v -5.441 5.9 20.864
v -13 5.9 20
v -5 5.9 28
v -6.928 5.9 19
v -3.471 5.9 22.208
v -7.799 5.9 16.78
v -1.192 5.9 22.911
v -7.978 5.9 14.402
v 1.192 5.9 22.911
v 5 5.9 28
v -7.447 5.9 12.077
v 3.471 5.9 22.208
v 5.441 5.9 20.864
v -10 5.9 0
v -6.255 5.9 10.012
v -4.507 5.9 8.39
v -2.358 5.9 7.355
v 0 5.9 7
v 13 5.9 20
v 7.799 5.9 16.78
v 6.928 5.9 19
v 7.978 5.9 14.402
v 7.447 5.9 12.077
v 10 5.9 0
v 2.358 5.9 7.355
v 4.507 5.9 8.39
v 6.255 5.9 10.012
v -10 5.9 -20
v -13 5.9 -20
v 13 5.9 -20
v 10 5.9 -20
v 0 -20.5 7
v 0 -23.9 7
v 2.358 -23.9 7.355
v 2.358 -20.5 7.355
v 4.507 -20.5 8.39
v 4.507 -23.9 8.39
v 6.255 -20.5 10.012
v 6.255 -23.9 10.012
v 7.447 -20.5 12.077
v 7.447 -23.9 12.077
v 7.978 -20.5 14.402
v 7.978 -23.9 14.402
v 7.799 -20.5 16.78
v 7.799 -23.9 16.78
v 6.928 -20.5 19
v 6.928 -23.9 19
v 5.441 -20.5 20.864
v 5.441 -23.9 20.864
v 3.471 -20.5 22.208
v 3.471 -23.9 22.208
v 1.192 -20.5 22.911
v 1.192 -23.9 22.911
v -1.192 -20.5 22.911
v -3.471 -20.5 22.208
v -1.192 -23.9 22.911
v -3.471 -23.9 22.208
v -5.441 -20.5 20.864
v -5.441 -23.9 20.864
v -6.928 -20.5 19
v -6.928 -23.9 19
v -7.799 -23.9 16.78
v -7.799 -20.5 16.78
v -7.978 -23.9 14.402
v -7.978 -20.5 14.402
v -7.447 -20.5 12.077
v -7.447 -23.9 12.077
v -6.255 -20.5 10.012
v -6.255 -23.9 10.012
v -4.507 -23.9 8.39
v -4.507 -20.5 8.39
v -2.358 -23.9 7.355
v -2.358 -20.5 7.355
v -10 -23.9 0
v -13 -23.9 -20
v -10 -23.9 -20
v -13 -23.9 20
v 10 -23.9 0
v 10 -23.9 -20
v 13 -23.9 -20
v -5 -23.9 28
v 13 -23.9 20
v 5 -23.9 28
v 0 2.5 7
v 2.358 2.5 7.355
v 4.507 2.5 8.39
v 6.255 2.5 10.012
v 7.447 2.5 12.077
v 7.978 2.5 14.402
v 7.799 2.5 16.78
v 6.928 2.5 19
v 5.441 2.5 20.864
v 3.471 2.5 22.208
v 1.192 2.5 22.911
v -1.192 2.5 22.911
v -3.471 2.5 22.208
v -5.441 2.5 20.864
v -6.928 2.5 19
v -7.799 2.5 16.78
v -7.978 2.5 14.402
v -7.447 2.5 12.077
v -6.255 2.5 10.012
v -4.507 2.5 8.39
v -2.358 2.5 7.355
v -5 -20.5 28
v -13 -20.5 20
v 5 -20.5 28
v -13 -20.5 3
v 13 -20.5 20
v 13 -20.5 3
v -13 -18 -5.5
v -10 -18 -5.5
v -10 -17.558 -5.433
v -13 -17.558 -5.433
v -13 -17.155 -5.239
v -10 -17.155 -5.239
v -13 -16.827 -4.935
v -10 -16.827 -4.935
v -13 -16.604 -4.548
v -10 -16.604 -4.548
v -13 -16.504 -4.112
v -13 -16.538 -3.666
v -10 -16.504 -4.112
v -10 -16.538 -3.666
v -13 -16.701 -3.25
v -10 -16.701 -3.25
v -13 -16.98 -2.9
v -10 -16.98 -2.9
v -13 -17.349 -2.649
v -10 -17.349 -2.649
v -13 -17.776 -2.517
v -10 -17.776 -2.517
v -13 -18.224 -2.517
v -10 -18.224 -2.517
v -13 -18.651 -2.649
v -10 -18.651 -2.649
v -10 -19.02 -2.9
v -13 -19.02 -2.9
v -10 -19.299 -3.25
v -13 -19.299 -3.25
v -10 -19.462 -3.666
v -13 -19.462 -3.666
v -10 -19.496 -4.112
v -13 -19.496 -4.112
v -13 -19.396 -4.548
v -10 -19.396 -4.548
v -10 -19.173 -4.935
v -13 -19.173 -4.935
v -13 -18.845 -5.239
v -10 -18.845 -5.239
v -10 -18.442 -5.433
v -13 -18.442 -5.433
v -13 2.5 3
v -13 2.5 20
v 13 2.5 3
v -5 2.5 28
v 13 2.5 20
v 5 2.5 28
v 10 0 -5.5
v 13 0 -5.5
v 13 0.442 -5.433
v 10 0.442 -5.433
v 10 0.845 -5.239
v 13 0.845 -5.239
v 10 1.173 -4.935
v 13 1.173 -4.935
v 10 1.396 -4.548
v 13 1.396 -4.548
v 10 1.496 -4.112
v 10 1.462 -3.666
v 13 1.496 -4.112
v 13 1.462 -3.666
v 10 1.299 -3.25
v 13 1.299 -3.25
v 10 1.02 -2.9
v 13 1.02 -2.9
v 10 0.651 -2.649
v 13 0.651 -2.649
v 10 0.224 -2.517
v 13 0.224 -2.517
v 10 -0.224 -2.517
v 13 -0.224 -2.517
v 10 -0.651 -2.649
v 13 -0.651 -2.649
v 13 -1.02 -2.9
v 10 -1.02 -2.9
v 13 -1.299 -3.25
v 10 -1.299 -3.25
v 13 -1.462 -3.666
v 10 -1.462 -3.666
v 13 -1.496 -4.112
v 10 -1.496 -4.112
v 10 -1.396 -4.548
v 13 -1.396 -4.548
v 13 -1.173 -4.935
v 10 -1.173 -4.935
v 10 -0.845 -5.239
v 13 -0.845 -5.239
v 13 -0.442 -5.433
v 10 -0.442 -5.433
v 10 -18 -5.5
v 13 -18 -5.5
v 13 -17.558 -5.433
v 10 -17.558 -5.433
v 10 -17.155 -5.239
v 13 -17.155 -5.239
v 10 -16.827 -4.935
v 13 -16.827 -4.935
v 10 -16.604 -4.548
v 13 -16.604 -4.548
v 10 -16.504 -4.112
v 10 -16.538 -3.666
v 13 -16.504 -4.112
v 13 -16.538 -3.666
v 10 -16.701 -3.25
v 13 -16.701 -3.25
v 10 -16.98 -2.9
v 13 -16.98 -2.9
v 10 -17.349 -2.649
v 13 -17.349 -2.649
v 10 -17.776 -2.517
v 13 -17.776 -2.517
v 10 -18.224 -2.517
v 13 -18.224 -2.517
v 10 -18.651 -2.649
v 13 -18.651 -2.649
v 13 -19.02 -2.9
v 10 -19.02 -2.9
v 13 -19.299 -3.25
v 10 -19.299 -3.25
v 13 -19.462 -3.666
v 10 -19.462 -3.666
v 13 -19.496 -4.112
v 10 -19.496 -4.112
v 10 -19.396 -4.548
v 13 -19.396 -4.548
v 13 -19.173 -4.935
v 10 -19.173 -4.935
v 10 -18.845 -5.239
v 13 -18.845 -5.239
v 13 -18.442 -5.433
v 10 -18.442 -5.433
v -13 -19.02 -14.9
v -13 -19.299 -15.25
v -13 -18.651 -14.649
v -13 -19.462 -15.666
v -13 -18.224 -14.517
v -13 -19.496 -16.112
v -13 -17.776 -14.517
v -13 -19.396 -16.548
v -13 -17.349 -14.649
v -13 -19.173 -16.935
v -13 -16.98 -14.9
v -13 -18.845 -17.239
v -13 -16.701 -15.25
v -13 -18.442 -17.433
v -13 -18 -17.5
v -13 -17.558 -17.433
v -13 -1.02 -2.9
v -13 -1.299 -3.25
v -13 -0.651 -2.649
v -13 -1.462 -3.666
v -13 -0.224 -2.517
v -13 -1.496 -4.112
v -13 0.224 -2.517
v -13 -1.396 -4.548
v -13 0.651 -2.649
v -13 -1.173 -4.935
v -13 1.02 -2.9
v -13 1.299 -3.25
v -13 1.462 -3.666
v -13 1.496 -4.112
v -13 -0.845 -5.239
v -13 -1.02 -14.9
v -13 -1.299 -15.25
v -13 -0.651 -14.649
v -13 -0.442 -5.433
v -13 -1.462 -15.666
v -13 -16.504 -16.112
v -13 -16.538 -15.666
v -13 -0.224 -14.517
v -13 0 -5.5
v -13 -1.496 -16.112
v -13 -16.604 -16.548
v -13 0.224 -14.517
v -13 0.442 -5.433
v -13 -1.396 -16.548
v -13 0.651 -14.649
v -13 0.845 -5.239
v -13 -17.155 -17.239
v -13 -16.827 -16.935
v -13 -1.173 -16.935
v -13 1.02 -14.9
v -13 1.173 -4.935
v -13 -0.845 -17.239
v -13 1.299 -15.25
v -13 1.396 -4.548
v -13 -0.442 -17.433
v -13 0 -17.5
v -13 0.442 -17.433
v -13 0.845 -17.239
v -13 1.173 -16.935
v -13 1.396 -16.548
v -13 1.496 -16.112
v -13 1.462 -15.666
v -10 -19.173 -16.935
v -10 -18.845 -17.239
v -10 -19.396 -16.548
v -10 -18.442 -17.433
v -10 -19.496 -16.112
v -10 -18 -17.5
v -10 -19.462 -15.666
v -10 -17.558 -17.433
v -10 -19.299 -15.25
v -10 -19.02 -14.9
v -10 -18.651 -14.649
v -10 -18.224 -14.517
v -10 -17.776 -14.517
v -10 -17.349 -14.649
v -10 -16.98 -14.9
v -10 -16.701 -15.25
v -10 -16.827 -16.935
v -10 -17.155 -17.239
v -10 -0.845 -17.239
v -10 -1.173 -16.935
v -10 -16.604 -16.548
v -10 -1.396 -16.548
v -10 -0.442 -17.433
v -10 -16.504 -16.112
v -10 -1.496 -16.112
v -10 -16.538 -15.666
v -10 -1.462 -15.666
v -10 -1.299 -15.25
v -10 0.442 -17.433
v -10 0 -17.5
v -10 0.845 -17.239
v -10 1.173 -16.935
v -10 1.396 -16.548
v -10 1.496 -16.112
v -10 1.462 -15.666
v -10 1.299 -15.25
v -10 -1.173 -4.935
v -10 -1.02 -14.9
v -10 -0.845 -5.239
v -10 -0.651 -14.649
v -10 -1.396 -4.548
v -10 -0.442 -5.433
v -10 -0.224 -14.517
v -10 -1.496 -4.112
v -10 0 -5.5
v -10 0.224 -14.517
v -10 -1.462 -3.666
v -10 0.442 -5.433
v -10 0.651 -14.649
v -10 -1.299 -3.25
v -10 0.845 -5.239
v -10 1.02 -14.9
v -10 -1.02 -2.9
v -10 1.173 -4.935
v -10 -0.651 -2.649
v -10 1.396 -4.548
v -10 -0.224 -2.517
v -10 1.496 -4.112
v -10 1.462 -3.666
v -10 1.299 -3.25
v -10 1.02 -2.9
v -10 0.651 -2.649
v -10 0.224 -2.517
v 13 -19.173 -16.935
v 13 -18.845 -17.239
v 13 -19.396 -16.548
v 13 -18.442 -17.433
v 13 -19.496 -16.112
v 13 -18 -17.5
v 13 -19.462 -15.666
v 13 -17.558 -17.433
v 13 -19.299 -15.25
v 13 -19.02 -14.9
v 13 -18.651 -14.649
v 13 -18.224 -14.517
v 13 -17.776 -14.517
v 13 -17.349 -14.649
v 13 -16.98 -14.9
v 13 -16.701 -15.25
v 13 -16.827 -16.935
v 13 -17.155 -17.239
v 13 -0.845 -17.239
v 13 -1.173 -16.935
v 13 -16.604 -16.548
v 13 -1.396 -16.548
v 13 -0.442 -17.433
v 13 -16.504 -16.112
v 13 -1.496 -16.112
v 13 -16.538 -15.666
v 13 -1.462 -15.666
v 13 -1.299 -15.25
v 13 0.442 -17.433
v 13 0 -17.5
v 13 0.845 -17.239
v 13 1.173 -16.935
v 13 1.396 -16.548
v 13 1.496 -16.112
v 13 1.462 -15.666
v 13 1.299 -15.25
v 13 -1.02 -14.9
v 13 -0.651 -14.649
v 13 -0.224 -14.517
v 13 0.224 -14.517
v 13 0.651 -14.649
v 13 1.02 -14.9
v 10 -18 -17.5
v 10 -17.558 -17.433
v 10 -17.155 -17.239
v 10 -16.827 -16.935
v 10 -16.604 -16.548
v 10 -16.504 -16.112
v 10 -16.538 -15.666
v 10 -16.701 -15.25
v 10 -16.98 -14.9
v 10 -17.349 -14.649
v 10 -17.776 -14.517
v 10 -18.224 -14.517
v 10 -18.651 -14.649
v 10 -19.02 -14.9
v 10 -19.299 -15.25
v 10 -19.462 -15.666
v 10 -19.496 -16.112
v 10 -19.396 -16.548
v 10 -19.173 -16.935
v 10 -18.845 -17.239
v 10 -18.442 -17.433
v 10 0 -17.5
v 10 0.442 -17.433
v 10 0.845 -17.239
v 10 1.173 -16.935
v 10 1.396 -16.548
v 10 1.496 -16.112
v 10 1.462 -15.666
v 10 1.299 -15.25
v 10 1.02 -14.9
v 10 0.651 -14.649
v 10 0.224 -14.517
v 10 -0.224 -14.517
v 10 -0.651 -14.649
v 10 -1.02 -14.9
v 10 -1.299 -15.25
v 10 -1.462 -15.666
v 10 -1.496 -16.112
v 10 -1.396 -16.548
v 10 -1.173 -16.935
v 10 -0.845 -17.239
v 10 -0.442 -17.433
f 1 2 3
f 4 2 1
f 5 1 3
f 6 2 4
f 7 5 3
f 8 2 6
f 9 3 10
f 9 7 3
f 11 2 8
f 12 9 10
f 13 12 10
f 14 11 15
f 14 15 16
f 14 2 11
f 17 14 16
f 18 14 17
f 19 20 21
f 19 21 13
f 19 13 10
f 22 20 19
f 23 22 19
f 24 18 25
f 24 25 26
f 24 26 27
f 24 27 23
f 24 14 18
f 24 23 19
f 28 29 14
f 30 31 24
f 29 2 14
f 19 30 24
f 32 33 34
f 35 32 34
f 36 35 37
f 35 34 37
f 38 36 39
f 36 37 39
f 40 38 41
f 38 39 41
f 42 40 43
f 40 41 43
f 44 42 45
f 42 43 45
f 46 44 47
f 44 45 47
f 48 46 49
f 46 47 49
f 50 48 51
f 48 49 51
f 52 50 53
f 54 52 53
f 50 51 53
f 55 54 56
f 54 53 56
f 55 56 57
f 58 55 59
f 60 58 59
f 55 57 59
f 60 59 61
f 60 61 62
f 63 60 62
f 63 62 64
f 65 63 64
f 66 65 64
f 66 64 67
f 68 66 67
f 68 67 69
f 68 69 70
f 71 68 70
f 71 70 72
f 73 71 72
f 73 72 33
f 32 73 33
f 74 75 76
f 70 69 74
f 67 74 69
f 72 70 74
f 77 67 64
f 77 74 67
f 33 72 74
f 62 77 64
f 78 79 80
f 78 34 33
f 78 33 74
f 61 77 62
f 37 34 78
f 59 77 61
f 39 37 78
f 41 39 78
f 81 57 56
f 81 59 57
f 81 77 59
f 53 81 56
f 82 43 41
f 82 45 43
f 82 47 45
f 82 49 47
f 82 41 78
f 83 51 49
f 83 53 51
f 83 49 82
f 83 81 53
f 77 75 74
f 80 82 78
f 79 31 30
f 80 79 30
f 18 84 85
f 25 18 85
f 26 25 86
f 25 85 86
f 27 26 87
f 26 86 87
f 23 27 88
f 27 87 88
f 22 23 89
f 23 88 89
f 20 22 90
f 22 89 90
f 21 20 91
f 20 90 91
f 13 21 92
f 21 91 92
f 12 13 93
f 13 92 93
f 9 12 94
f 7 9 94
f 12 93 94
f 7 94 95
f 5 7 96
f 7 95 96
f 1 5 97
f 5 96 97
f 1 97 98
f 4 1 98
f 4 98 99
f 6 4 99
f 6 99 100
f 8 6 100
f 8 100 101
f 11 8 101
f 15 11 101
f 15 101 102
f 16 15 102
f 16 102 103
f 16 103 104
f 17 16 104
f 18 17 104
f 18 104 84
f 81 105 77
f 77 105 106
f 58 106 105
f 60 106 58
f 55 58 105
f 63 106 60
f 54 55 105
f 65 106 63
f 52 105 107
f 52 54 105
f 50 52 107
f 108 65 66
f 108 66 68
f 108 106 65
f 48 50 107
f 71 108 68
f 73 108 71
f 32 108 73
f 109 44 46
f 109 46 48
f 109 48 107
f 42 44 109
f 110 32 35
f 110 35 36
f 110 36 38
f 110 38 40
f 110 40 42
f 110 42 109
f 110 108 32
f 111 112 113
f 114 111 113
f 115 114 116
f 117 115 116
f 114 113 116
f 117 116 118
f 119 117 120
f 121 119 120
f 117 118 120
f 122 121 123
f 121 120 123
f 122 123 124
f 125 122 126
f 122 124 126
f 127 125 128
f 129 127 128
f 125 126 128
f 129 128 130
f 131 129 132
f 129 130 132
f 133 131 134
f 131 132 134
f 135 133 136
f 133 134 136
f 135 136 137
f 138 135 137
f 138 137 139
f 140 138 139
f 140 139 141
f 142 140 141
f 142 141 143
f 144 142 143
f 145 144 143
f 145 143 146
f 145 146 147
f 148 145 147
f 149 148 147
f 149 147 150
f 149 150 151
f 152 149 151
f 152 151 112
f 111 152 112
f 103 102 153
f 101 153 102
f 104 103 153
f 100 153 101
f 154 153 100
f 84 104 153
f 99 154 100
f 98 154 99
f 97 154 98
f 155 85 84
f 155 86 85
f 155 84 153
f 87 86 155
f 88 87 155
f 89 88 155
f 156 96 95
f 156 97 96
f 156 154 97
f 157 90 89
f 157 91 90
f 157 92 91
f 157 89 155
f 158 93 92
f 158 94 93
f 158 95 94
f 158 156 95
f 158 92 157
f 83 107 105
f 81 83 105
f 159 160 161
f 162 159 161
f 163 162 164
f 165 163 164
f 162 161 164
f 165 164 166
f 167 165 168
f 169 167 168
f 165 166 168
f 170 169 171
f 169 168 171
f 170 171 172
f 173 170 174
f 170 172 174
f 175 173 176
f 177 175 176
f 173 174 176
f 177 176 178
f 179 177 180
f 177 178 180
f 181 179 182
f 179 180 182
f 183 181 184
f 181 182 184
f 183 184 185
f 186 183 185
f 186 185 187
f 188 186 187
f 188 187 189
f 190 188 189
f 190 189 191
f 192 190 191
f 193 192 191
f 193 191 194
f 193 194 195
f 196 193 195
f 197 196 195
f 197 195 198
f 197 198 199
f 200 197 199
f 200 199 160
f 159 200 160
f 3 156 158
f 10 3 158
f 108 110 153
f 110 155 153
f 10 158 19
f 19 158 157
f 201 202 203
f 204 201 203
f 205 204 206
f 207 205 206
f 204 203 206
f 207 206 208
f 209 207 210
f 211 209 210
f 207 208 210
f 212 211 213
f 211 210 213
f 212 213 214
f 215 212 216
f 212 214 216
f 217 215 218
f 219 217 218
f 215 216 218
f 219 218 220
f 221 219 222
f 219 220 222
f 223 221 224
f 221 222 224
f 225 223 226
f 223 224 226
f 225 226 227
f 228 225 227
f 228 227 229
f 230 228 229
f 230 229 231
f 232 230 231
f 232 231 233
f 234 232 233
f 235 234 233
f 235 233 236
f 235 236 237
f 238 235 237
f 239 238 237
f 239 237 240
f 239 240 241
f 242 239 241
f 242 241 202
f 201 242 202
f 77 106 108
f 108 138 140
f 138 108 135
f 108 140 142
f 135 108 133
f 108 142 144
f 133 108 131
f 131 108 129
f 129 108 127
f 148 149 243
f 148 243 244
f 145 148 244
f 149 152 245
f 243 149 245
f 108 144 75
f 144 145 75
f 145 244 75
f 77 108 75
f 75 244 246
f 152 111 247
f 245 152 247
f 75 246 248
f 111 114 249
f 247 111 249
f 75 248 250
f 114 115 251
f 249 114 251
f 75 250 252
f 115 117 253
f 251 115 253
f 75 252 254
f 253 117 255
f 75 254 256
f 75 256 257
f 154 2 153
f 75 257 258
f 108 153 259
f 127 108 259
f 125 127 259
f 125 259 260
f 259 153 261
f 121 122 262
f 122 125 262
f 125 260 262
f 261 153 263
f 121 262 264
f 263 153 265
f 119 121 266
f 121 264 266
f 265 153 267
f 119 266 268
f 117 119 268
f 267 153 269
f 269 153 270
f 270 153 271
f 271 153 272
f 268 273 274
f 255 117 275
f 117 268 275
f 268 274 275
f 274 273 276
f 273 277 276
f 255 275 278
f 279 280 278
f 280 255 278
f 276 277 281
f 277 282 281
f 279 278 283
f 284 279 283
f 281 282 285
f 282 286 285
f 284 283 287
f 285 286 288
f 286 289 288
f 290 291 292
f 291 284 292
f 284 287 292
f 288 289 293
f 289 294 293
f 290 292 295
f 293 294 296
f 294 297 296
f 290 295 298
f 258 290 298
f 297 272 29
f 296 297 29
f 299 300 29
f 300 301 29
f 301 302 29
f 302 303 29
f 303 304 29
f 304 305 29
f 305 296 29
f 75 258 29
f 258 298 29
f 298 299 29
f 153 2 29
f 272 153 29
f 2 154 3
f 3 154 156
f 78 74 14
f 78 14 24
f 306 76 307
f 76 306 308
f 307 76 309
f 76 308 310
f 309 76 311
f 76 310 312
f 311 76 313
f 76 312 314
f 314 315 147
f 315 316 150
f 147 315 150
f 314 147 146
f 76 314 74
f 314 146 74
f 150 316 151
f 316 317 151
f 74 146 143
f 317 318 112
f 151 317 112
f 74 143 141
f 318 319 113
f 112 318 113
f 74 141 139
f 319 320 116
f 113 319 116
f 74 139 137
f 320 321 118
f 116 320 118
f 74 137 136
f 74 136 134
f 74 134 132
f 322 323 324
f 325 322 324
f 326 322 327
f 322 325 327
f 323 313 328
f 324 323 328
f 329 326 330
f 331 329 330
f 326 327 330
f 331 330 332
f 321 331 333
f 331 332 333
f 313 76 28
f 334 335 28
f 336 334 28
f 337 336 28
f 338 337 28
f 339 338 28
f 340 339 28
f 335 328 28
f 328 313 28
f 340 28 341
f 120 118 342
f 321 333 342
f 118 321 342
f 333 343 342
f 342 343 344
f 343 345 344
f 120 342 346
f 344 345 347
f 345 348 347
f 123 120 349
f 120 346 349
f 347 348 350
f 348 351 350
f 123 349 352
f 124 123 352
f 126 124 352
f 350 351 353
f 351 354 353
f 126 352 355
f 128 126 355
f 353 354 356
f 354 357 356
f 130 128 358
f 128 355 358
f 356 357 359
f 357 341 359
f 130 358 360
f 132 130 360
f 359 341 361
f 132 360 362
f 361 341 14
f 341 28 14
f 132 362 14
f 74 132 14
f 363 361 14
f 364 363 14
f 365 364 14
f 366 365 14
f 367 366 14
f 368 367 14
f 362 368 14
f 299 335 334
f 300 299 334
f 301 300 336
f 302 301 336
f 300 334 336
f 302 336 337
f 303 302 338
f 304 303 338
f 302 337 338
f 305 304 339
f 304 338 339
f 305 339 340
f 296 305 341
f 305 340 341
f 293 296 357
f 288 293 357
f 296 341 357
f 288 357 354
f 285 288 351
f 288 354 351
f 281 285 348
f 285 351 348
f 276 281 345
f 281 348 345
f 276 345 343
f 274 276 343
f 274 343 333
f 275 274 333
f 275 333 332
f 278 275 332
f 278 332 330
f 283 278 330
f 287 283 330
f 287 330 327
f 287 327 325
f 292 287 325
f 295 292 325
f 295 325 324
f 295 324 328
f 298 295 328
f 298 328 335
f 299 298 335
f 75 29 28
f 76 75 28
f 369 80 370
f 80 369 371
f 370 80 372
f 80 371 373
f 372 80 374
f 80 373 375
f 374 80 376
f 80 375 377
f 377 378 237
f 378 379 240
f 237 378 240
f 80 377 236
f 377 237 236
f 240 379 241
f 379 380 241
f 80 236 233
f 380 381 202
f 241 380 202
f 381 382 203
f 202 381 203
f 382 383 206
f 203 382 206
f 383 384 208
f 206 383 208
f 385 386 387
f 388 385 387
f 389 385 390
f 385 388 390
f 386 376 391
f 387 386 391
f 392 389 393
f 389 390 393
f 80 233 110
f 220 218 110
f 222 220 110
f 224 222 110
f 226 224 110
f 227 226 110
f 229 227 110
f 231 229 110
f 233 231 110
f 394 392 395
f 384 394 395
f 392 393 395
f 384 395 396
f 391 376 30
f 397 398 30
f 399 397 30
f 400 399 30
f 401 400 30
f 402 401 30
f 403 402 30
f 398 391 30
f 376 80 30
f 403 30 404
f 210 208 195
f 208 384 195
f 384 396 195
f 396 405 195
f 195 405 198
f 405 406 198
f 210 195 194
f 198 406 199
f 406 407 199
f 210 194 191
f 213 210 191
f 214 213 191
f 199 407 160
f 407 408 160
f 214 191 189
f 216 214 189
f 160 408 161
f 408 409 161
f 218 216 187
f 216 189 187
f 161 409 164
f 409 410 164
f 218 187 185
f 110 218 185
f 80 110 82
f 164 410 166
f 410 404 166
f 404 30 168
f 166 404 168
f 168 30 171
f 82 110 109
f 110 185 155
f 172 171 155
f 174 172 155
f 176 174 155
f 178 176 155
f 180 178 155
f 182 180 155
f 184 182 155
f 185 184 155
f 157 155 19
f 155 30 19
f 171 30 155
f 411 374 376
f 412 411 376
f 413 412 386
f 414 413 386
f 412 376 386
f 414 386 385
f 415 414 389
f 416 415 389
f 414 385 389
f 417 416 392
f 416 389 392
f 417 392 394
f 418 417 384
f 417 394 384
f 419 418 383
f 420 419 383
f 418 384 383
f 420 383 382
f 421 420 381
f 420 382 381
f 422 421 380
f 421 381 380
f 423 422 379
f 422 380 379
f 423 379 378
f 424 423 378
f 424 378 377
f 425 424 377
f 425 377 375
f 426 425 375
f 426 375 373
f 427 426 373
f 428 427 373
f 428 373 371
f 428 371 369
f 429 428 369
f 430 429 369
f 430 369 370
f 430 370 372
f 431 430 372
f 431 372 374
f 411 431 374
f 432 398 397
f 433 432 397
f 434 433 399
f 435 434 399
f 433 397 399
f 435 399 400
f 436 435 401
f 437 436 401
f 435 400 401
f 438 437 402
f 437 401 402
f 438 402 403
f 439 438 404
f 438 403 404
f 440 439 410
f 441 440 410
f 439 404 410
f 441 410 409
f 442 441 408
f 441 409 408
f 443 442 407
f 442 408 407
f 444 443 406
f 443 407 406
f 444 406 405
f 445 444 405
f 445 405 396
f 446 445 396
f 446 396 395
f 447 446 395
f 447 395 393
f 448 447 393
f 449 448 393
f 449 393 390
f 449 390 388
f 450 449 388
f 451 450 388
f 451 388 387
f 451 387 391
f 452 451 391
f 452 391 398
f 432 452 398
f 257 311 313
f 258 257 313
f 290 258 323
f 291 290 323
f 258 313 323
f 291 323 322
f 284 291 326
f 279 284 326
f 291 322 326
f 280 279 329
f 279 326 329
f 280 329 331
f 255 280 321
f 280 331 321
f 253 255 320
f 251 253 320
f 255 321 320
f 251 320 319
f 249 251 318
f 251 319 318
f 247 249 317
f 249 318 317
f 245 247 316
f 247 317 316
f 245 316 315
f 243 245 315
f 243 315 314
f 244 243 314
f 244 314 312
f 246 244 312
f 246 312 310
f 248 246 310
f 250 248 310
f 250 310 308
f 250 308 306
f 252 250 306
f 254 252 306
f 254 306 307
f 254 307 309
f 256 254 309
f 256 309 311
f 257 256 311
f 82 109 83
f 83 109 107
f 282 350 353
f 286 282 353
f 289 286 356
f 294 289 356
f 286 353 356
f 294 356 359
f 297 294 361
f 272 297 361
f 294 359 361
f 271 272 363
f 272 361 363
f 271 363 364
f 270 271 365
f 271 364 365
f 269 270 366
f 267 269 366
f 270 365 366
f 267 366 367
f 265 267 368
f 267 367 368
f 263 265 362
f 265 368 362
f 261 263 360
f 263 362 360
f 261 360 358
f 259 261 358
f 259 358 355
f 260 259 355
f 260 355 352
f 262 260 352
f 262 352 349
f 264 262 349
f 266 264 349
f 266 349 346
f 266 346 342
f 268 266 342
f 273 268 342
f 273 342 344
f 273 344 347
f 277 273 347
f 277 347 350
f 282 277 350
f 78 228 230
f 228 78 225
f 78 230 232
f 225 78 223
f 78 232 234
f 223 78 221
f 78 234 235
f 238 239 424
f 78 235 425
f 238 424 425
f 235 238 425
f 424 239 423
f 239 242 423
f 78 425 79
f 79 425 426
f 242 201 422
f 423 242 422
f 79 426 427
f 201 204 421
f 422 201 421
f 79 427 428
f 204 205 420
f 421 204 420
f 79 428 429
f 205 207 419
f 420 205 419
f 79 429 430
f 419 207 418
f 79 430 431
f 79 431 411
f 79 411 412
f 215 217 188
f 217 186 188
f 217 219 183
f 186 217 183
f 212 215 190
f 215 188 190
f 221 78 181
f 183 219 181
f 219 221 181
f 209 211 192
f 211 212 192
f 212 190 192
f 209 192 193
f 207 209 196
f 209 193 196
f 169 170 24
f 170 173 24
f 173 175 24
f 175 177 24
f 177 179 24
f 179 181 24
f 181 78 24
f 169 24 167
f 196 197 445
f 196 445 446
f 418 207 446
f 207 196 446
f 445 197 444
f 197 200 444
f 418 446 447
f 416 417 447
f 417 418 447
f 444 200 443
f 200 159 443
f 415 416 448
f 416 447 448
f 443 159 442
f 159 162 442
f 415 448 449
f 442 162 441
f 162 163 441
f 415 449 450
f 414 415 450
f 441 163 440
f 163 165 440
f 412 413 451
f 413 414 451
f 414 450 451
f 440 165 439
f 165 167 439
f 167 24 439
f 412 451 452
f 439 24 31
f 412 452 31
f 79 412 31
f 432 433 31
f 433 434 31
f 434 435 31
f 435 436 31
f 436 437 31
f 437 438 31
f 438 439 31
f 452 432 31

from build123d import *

# Parameters (mm, degrees)
SKETCH_1_W           = 26
SKETCH_1_H           = 20
EXTRUDE_1_DEPTH      = 3
EXTRUDE_2_DEPTH      = 16
SKETCH_5_W           = 3
SKETCH_5_H           = 20
EXTRUDE_3_DEPTH      = 20
SKETCH_8_W           = 23
SKETCH_8_H           = 8
CUT_EXTRUDE_5_DEPTH  = 40
CHAMFER_1_SIZE       = 8
SKETCH_16_W          = 23
SKETCH_16_H          = 4
CUT_EXTRUDE_8_DEPTH  = 26
SKETCH_17_W          = 16.892856711
SKETCH_17_H          = 8
CUT_EXTRUDE_9_DEPTH  = 10
EXTRUDE_4_DEPTH      = 14
CUT_EXTRUDE_10_DEPTH = 14
SKETCH_20_R          = 8
CUT_EXTRUDE_11_DEPTH = 39
SKETCH_21_R          = 9
CUT_EXTRUDE_12_DEPTH = 0.1
CUT_EXTRUDE_START    = -0.1
SKETCH_22_R          = 9
CUT_EXTRUDE_13_DEPTH = 0.1
SKETCH_23_R          = 1.5
CUT_EXTRUDE_14_DEPTH = 38.1
CUT_EXTRUDE_15_DEPTH = 0.5
CUT_EXTRUDE_16_DEPTH = 0.5
CUT_EXTRUDE_17_DEPTH = 0.1
CUT_EXTRUDE_18_DEPTH = 0.1


with BuildPart() as part:
    # 草图1 → 凸台-拉伸1 (new body)
    with BuildSketch(Plane.XY):
        Rectangle(SKETCH_1_W, SKETCH_1_H)
    extrude(amount=EXTRUDE_1_DEPTH)

    # 草图2 → 凸台-拉伸2 (add)
    with BuildSketch(Plane.XZ.offset(10)):
        Polygon((-13, 3), (-13, 15), (-13, 28), (13, 28), (13, 15), (13, 3), align=None)
    extrude(amount=-EXTRUDE_2_DEPTH)

    # 草图5 → 凸台-拉伸3 (add)
    with BuildSketch(Plane(origin=(0, 0, 0), x_dir=(-1, 0, 0), z_dir=(0, 0, -1))):
        with Locations((11.5, 0)):
            Rectangle(SKETCH_5_W, SKETCH_5_H)
        with Locations((-11.5, 0)):
            Rectangle(SKETCH_5_W, SKETCH_5_H)
    extrude(amount=EXTRUDE_3_DEPTH)

    # 草图8 → 切除-拉伸5 (cut)
    with BuildSketch(Plane(origin=(13, 0, 0), x_dir=(0, 0, -1), z_dir=(1, 0, 0))):
        with Locations((-14.5, -2)):
            Rectangle(SKETCH_8_W, SKETCH_8_H)
    extrude(amount=-CUT_EXTRUDE_5_DEPTH, mode=Mode.SUBTRACT)

    # 倒角1
    # the kernel refuses this chamfer: 8 mm, written as the material it takes off along each edge
    with BuildSketch(Plane(origin=(-13, -30.573463904, 28), x_dir=(-0.02749587661058627, 0, -0.9996219169112968), z_dir=(0, 1, 0)), Plane(origin=(13, -30.573463904, 28), x_dir=(-0.9996219169112968, 0, 0.027495876610586487), z_dir=(0, 1, 0))) as chamfer_1_piece_1:
        Polygon((CHAMFER_1_SIZE * 0.999621916911, -CHAMFER_1_SIZE * 0.0274958766106), (-CHAMFER_1_SIZE * 0.0274958766106, -CHAMFER_1_SIZE * 0.999621916911), (0, 0), align=None)
    extrude(amount=57.146927807, mode=Mode.SUBTRACT)

    # 草图16 → 切除-拉伸8 (cut)
    with BuildSketch(Plane(origin=(13, 0, 0), x_dir=(0, 0, -1), z_dir=(1, 0, 0))):
        with Locations((8.5, 8)):
            Rectangle(SKETCH_16_W, SKETCH_16_H)
    extrude(amount=-CUT_EXTRUDE_8_DEPTH, mode=Mode.SUBTRACT)

    # 草图17 → 切除-拉伸9 (cut)
    with BuildSketch(Plane.XY.offset(28)):
        with Locations((0.093159136, -2)):
            Rectangle(SKETCH_17_W, SKETCH_17_H)
    extrude(amount=-CUT_EXTRUDE_9_DEPTH, mode=Mode.SUBTRACT)

    # 草图18 → 凸台-拉伸4 (add)
    with BuildSketch(Plane.XZ.offset(10)):
        Polygon((5, 28), (-5, 28), (-13, 20), (-13, -20), (-10, -20), (-10, 0), (10, 0), (10, -20), (13, -20), (13, 20), align=None)
    extrude(amount=EXTRUDE_4_DEPTH)

    # 草图19 → 切除-拉伸10 (cut)
    with BuildSketch(Plane(origin=(0, -6, 0), x_dir=(1, 0, 0), z_dir=(0, 1, 0))):
        Polygon((5, -28), (13, -20), (13, -3), (-13, -3), (-13, -20), (-5, -28), align=None)
    extrude(amount=-CUT_EXTRUDE_10_DEPTH, mode=Mode.SUBTRACT)

    # 草图20 → 切除-拉伸11 (cut)
    with BuildSketch(Plane.XZ.offset(24)):
        with Locations(Location((0, 15, 0), (0, 0, 270))):
            Circle(SKETCH_20_R)
    extrude(amount=-CUT_EXTRUDE_11_DEPTH, mode=Mode.SUBTRACT)

    # 草图21 → 切除-拉伸12 (cut)
    with BuildSketch(Plane.XZ.offset(24)):
        with Locations(Location((0, 15, 0), (0, 0, 270))):
            Circle(SKETCH_21_R)
    extrude(amount=-CUT_EXTRUDE_12_DEPTH, mode=Mode.SUBTRACT)

    # 草图22 → 切除-拉伸13 (cut)
    with BuildSketch(Plane(origin=(0, 6, 0), x_dir=(1, 0, 0), z_dir=(0, 1, 0)).offset(CUT_EXTRUDE_START)):
        with Locations(Location((0, -15, 0), (0, 0, 90))):
            Circle(SKETCH_22_R)
    extrude(amount=CUT_EXTRUDE_13_DEPTH, mode=Mode.SUBTRACT)

    # 草图23 → 切除-拉伸14 (cut)
    with BuildSketch(Plane(origin=(13, 0, 0), x_dir=(0, 0, -1), z_dir=(1, 0, 0))):
        with Locations((4, 0)):
            Circle(SKETCH_23_R)
        with Locations((16, 0)):
            Circle(SKETCH_23_R)
        with Locations((4, -18)):
            Circle(SKETCH_23_R)
        with Locations((16, -18)):
            Circle(SKETCH_23_R)
    extrude(amount=-CUT_EXTRUDE_14_DEPTH, mode=Mode.SUBTRACT)

    # 草图24 → 切除-拉伸15 (cut)
    with BuildSketch(Plane.XZ.offset(-2)):
        Polygon((-5, 28), (-13, 20), (-13, 3), (13, 3), (13, 20), (5, 28), align=None)
    extrude(amount=-CUT_EXTRUDE_15_DEPTH, mode=Mode.SUBTRACT)

    # 草图25 → 切除-拉伸16 (cut)
    with BuildSketch(Plane(origin=(0, -20, 0), x_dir=(1, 0, 0), z_dir=(0, 1, 0))):
        Polygon((-5, -28), (5, -28), (13, -20), (13, -3), (-13, -3), (-13, -20), align=None)
    extrude(amount=-CUT_EXTRUDE_16_DEPTH, mode=Mode.SUBTRACT)

    # 草图26 → 切除-拉伸17 (cut)
    with BuildSketch(Plane.XZ.offset(24)):
        Polygon((13, 20), (5, 28), (-5, 28), (-13, 20), (-13, -20), (-10, -20), (-10, 0), (10, 0), (10, -20), (13, -20), align=None)
    extrude(amount=-CUT_EXTRUDE_17_DEPTH, mode=Mode.SUBTRACT)

    # 草图27 → 切除-拉伸18 (cut)
    with BuildSketch(Plane(origin=(0, 6, 0), x_dir=(1, 0, 0), z_dir=(0, 1, 0))):
        Polygon((-13, 20), (-13, -20), (-5, -28), (5, -28), (13, -20), (13, 20), (10, 20), (10, 0), (-10, 0), (-10, 20), align=None)
    extrude(amount=-CUT_EXTRUDE_18_DEPTH, mode=Mode.SUBTRACT)


solid = part.part
